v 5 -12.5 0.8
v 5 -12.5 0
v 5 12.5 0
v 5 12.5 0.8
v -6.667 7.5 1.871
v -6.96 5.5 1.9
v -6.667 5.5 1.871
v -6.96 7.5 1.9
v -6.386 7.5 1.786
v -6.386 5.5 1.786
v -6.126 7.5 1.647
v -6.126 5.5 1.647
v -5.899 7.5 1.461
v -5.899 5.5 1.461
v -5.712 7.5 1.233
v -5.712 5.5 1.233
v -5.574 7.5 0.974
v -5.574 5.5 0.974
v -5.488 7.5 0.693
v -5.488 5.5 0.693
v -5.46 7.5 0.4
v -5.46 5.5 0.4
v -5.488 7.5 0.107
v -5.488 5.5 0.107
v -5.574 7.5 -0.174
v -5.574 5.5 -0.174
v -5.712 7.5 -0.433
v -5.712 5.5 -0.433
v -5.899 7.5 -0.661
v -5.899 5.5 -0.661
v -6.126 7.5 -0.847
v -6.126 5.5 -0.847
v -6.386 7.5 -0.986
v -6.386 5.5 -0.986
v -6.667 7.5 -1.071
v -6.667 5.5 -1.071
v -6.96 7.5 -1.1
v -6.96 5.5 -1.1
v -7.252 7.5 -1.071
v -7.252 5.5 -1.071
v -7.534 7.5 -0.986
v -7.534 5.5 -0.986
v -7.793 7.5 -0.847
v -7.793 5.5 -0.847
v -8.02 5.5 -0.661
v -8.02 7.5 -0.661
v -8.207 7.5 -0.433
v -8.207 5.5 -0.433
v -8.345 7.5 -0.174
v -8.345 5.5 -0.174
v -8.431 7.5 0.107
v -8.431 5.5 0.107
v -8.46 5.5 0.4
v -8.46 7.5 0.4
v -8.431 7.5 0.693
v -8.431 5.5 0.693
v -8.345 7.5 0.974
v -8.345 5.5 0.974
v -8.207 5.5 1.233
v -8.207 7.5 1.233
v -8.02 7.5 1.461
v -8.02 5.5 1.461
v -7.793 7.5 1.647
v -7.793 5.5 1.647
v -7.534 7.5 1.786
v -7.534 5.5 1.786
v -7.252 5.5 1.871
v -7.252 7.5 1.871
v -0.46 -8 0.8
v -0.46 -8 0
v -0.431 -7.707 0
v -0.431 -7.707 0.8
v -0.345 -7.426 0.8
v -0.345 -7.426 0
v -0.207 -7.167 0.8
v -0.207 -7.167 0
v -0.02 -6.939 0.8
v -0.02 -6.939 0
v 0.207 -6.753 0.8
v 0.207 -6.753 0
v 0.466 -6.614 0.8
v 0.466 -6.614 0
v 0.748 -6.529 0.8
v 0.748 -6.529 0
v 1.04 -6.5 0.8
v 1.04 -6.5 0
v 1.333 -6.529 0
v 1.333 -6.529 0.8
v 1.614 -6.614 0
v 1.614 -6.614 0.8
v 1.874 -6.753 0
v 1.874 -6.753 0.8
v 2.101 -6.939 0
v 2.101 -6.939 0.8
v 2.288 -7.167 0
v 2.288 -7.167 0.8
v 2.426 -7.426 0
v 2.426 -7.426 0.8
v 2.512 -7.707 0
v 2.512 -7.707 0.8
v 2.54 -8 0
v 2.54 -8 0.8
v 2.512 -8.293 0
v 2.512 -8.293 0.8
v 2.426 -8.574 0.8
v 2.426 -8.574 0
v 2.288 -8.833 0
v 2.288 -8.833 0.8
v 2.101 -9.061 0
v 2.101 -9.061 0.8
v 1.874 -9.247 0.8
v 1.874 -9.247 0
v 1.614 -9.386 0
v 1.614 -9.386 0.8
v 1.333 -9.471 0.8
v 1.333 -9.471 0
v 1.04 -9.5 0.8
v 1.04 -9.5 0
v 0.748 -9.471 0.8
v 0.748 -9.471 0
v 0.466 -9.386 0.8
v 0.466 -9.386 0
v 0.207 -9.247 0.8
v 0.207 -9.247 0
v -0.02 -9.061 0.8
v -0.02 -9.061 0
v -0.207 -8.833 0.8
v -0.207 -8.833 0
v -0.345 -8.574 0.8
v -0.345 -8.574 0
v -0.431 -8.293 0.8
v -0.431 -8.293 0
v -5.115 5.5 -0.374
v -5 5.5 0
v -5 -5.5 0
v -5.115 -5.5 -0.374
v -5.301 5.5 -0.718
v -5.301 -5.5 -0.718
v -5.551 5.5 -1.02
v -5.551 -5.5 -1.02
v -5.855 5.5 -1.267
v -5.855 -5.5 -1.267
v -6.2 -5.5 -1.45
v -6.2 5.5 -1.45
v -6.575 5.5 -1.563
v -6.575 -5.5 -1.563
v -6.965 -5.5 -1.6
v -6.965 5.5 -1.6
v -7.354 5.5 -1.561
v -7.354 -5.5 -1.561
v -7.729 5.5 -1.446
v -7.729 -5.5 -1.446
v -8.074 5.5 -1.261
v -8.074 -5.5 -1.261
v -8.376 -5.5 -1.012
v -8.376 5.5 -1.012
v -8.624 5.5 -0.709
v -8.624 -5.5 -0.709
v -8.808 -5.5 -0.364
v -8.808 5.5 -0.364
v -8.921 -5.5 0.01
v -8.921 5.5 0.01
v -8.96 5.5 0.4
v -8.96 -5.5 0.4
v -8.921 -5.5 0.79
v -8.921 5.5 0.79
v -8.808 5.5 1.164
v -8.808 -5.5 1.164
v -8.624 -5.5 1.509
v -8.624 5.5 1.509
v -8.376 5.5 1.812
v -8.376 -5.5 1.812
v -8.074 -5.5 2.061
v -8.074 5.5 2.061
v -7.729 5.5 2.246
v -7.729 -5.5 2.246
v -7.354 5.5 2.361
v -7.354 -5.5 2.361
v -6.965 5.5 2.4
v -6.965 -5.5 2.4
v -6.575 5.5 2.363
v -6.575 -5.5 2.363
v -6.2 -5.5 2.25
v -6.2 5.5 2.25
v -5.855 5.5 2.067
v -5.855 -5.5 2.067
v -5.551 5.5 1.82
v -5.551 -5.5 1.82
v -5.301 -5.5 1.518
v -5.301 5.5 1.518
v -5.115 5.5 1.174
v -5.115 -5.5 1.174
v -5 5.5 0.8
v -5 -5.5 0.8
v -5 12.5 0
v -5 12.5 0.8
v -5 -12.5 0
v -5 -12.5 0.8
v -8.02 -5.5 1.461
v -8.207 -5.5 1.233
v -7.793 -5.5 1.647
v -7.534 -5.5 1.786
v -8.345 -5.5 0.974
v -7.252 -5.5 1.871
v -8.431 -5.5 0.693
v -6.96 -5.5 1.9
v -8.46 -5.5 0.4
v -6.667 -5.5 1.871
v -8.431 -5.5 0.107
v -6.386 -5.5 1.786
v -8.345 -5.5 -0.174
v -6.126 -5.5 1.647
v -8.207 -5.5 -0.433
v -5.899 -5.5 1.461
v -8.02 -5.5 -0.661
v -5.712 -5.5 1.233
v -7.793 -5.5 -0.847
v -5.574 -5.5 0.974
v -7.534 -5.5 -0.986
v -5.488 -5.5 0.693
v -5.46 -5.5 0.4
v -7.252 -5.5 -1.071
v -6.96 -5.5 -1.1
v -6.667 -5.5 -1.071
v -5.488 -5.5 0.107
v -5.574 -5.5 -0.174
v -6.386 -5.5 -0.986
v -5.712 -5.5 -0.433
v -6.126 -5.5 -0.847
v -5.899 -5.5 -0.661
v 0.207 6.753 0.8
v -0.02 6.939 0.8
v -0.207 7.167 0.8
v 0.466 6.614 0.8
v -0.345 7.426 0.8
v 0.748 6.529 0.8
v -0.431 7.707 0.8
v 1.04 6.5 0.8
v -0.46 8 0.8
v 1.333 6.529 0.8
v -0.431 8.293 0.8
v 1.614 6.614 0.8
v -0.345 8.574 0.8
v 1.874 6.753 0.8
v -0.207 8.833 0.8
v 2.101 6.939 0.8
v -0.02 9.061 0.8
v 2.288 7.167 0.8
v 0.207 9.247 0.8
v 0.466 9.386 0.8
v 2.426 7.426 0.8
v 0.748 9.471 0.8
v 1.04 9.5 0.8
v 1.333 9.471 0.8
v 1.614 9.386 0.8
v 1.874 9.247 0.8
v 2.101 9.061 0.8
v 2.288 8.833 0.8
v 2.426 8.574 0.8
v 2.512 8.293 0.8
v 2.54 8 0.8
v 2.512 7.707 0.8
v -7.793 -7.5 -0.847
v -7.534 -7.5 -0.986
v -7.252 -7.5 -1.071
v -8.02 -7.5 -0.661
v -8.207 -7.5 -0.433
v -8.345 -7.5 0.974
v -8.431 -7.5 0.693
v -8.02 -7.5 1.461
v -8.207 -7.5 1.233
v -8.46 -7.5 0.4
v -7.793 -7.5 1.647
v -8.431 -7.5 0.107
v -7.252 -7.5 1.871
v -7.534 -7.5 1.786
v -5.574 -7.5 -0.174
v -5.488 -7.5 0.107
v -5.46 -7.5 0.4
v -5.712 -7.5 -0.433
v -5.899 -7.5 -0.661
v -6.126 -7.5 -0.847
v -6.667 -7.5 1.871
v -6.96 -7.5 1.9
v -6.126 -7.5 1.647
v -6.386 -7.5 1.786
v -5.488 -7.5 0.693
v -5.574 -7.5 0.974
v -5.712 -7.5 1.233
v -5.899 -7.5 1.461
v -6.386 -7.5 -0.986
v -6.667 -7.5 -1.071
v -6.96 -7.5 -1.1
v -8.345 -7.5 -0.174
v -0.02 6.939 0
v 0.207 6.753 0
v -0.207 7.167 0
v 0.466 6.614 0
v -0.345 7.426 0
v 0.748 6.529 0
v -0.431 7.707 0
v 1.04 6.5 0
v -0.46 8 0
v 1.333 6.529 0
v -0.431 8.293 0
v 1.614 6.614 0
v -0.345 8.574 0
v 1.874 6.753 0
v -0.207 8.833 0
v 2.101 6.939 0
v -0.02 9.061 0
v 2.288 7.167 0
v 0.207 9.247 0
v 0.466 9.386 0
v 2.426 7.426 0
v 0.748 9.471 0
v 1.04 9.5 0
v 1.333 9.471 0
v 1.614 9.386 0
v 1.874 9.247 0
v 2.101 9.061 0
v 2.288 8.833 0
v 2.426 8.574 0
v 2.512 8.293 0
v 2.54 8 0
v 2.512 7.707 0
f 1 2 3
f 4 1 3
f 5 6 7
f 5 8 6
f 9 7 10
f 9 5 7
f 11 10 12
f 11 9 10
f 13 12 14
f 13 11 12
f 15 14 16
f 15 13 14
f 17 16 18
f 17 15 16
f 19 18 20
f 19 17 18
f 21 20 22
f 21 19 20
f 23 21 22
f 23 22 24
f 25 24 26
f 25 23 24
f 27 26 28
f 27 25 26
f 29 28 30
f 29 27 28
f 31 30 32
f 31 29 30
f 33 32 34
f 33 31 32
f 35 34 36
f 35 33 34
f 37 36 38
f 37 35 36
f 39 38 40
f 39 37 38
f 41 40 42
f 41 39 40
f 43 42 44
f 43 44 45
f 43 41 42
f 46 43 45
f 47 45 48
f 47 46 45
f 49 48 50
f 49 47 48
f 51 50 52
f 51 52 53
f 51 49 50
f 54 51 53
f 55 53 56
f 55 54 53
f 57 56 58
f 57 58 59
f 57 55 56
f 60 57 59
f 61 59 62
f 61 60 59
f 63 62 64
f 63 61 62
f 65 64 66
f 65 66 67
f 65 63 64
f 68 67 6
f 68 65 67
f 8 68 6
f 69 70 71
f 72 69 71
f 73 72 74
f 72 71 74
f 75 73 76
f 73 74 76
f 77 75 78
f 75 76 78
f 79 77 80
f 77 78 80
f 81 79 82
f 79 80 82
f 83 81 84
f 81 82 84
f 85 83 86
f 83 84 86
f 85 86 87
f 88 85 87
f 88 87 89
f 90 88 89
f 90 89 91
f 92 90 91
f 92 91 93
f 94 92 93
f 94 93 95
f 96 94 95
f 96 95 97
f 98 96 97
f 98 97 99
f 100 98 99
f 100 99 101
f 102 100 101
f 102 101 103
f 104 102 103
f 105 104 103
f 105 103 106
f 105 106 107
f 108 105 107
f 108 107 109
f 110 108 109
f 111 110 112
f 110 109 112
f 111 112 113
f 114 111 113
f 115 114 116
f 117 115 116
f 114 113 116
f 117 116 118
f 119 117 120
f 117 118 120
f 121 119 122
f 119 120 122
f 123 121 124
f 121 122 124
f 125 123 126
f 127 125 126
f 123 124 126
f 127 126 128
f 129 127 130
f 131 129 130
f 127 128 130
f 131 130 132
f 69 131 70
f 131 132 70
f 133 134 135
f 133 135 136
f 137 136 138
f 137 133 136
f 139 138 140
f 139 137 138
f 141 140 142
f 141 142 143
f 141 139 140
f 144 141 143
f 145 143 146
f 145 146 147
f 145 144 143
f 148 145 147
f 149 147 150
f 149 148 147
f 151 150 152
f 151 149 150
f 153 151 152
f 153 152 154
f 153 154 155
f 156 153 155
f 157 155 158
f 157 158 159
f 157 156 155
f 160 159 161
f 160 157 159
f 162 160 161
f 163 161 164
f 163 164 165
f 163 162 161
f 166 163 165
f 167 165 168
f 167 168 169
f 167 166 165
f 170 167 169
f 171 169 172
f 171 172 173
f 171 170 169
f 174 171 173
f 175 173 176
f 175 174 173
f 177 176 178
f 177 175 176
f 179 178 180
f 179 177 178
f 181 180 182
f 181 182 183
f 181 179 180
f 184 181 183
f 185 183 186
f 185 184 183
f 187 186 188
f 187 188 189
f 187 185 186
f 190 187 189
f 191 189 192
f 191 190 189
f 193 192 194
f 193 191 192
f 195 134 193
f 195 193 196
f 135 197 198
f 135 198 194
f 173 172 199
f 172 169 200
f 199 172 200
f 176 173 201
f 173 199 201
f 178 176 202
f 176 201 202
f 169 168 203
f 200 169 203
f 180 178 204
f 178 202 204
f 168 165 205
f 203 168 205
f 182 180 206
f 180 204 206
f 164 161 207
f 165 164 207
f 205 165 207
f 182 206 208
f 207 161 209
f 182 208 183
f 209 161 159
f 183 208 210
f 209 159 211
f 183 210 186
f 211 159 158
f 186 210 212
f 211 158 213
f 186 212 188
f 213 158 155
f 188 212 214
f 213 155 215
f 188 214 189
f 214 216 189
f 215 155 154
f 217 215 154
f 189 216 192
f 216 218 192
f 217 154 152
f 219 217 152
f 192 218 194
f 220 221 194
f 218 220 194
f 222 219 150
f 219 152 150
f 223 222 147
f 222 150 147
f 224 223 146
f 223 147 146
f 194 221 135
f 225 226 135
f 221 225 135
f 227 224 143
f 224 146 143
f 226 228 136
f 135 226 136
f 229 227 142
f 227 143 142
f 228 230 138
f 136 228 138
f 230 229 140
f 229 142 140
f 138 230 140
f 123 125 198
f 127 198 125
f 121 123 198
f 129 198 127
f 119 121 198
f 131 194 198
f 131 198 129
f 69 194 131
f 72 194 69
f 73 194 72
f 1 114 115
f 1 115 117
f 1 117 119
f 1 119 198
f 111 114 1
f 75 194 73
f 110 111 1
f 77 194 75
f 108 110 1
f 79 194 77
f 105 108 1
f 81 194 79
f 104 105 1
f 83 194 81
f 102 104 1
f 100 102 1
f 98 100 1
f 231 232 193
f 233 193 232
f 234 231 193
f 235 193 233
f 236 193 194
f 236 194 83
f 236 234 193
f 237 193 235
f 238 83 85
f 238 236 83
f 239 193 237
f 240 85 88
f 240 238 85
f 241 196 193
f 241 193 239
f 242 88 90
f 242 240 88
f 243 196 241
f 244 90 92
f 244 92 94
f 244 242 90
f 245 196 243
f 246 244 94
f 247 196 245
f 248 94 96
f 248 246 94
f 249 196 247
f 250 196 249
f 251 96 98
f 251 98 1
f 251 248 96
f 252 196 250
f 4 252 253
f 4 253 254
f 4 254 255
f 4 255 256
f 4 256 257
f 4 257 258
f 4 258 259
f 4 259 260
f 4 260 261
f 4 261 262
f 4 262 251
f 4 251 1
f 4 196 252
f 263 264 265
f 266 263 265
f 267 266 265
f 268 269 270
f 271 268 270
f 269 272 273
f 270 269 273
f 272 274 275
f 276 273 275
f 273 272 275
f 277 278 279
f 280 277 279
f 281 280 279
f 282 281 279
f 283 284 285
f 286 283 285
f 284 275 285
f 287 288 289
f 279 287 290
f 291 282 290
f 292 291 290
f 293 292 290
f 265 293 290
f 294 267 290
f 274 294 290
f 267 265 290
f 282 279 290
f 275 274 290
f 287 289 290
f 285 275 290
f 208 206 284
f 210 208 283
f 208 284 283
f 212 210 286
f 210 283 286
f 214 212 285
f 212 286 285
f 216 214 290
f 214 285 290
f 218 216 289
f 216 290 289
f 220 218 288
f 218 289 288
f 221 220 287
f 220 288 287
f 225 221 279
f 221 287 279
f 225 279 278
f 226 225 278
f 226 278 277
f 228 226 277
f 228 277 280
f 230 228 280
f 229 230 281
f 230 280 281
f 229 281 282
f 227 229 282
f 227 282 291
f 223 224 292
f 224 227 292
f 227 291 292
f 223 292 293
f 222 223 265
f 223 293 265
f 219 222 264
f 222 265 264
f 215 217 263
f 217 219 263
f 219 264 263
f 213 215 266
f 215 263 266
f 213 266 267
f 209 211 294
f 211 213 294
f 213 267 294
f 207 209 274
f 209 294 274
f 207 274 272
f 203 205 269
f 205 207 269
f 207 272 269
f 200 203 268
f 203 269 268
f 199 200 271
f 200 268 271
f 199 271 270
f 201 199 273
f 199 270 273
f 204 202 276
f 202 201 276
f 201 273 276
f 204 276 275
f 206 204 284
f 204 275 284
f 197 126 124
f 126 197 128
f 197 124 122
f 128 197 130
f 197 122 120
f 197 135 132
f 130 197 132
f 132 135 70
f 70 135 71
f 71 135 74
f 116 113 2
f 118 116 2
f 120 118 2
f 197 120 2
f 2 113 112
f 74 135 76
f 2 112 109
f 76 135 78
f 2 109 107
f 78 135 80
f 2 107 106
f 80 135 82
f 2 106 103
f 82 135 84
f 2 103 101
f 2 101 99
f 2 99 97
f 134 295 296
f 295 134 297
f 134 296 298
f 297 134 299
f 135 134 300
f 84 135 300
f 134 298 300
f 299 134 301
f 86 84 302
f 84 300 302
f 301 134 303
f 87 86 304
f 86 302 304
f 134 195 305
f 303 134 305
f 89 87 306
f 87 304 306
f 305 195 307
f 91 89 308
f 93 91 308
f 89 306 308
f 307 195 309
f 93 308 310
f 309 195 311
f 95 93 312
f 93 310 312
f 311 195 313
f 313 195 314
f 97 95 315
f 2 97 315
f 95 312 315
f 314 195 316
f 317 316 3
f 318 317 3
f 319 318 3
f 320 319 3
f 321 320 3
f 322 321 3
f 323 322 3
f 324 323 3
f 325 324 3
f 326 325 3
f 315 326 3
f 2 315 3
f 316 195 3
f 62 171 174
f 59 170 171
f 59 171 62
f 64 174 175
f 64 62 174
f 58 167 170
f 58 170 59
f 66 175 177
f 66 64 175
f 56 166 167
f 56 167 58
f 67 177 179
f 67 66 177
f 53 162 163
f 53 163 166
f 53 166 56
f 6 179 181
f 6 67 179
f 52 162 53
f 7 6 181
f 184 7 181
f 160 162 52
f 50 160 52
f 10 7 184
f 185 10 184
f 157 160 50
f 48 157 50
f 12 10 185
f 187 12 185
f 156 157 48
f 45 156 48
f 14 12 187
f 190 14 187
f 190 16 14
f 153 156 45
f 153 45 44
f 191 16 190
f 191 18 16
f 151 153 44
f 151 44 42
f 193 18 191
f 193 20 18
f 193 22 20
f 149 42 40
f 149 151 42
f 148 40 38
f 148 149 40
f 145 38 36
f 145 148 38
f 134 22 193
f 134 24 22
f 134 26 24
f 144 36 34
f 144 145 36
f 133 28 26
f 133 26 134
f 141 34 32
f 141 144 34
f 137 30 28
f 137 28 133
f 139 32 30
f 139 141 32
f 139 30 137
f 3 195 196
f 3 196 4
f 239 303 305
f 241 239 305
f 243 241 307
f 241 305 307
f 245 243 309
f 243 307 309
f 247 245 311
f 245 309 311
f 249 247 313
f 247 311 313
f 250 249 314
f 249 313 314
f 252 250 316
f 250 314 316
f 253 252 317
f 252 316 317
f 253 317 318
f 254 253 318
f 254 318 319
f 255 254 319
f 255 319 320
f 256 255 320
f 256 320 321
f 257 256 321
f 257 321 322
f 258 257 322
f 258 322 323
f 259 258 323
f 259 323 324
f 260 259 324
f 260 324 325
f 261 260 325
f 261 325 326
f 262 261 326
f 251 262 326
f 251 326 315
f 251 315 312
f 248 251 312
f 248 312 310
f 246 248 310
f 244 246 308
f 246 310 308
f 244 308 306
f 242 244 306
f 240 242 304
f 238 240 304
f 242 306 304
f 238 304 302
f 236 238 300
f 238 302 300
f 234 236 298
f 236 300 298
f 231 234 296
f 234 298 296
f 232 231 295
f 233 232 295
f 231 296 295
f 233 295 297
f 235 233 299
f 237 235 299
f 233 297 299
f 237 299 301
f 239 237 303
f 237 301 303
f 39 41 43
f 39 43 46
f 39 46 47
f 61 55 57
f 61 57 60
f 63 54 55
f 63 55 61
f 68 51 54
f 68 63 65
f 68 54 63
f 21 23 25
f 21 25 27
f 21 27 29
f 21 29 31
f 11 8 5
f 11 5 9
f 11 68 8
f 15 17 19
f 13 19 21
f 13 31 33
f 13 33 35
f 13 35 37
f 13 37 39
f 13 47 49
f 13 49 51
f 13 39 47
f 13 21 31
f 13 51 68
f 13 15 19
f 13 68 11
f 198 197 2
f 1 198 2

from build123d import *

# Parameters (mm, degrees)
SKETCH_1_W          = 10
SKETCH_1_H          = 25
EXTRUDE_1_DEPTH     = 0.8
SKETCH_4_R          = 2
EXTRUDE_2_DEPTH     = 5.5
SKETCH_5_R          = 1.5
EXTRUDE_3_DEPTH     = 2
SKETCH_6_R          = 1.5
CUT_EXTRUDE_1_DEPTH = 4


with BuildPart() as part:
    # 草图1 → 凸台-拉伸1 (new body)
    with BuildSketch(Plane.XY):
        Rectangle(SKETCH_1_W, SKETCH_1_H)
    extrude(amount=EXTRUDE_1_DEPTH)

    # 草图4 → 凸台-拉伸2 (add, symmetric)
    with BuildSketch(Plane(origin=(0, 0, 0), x_dir=(1, 0, 0), z_dir=(0, 1, 0))):
        with Locations((-6.959591794, -0.4)):
            Circle(SKETCH_4_R)
    extrude(amount=EXTRUDE_2_DEPTH, both=True)

    # 草图5 → 凸台-拉伸3 (add, symmetric)
    with BuildSketch(Plane(origin=(0, 5.5, 0), x_dir=(1, 0, 0), z_dir=(0, 1, 0))):
        with Locations(Location((-6.959591794, -0.4, 0), (0, 0, 270))):
            Circle(SKETCH_5_R)
    extrude_3 = extrude(amount=EXTRUDE_3_DEPTH, both=True)

    # 镜向1: 凸台-拉伸3 across plane
    add(extrude_3.mirror(Plane.ZX))

    # 草图6 → 切除-拉伸1 (cut)
    with BuildSketch(Plane(origin=(0, 0, 0), x_dir=(-1, 0, 0), z_dir=(0, 0, -1))):
        with Locations((-1.040408206, 8)):
            Circle(SKETCH_6_R)
        with Locations((-1.040408206, -8)):
            Circle(SKETCH_6_R)
    extrude(amount=-CUT_EXTRUDE_1_DEPTH, mode=Mode.SUBTRACT)


solid = part.part
